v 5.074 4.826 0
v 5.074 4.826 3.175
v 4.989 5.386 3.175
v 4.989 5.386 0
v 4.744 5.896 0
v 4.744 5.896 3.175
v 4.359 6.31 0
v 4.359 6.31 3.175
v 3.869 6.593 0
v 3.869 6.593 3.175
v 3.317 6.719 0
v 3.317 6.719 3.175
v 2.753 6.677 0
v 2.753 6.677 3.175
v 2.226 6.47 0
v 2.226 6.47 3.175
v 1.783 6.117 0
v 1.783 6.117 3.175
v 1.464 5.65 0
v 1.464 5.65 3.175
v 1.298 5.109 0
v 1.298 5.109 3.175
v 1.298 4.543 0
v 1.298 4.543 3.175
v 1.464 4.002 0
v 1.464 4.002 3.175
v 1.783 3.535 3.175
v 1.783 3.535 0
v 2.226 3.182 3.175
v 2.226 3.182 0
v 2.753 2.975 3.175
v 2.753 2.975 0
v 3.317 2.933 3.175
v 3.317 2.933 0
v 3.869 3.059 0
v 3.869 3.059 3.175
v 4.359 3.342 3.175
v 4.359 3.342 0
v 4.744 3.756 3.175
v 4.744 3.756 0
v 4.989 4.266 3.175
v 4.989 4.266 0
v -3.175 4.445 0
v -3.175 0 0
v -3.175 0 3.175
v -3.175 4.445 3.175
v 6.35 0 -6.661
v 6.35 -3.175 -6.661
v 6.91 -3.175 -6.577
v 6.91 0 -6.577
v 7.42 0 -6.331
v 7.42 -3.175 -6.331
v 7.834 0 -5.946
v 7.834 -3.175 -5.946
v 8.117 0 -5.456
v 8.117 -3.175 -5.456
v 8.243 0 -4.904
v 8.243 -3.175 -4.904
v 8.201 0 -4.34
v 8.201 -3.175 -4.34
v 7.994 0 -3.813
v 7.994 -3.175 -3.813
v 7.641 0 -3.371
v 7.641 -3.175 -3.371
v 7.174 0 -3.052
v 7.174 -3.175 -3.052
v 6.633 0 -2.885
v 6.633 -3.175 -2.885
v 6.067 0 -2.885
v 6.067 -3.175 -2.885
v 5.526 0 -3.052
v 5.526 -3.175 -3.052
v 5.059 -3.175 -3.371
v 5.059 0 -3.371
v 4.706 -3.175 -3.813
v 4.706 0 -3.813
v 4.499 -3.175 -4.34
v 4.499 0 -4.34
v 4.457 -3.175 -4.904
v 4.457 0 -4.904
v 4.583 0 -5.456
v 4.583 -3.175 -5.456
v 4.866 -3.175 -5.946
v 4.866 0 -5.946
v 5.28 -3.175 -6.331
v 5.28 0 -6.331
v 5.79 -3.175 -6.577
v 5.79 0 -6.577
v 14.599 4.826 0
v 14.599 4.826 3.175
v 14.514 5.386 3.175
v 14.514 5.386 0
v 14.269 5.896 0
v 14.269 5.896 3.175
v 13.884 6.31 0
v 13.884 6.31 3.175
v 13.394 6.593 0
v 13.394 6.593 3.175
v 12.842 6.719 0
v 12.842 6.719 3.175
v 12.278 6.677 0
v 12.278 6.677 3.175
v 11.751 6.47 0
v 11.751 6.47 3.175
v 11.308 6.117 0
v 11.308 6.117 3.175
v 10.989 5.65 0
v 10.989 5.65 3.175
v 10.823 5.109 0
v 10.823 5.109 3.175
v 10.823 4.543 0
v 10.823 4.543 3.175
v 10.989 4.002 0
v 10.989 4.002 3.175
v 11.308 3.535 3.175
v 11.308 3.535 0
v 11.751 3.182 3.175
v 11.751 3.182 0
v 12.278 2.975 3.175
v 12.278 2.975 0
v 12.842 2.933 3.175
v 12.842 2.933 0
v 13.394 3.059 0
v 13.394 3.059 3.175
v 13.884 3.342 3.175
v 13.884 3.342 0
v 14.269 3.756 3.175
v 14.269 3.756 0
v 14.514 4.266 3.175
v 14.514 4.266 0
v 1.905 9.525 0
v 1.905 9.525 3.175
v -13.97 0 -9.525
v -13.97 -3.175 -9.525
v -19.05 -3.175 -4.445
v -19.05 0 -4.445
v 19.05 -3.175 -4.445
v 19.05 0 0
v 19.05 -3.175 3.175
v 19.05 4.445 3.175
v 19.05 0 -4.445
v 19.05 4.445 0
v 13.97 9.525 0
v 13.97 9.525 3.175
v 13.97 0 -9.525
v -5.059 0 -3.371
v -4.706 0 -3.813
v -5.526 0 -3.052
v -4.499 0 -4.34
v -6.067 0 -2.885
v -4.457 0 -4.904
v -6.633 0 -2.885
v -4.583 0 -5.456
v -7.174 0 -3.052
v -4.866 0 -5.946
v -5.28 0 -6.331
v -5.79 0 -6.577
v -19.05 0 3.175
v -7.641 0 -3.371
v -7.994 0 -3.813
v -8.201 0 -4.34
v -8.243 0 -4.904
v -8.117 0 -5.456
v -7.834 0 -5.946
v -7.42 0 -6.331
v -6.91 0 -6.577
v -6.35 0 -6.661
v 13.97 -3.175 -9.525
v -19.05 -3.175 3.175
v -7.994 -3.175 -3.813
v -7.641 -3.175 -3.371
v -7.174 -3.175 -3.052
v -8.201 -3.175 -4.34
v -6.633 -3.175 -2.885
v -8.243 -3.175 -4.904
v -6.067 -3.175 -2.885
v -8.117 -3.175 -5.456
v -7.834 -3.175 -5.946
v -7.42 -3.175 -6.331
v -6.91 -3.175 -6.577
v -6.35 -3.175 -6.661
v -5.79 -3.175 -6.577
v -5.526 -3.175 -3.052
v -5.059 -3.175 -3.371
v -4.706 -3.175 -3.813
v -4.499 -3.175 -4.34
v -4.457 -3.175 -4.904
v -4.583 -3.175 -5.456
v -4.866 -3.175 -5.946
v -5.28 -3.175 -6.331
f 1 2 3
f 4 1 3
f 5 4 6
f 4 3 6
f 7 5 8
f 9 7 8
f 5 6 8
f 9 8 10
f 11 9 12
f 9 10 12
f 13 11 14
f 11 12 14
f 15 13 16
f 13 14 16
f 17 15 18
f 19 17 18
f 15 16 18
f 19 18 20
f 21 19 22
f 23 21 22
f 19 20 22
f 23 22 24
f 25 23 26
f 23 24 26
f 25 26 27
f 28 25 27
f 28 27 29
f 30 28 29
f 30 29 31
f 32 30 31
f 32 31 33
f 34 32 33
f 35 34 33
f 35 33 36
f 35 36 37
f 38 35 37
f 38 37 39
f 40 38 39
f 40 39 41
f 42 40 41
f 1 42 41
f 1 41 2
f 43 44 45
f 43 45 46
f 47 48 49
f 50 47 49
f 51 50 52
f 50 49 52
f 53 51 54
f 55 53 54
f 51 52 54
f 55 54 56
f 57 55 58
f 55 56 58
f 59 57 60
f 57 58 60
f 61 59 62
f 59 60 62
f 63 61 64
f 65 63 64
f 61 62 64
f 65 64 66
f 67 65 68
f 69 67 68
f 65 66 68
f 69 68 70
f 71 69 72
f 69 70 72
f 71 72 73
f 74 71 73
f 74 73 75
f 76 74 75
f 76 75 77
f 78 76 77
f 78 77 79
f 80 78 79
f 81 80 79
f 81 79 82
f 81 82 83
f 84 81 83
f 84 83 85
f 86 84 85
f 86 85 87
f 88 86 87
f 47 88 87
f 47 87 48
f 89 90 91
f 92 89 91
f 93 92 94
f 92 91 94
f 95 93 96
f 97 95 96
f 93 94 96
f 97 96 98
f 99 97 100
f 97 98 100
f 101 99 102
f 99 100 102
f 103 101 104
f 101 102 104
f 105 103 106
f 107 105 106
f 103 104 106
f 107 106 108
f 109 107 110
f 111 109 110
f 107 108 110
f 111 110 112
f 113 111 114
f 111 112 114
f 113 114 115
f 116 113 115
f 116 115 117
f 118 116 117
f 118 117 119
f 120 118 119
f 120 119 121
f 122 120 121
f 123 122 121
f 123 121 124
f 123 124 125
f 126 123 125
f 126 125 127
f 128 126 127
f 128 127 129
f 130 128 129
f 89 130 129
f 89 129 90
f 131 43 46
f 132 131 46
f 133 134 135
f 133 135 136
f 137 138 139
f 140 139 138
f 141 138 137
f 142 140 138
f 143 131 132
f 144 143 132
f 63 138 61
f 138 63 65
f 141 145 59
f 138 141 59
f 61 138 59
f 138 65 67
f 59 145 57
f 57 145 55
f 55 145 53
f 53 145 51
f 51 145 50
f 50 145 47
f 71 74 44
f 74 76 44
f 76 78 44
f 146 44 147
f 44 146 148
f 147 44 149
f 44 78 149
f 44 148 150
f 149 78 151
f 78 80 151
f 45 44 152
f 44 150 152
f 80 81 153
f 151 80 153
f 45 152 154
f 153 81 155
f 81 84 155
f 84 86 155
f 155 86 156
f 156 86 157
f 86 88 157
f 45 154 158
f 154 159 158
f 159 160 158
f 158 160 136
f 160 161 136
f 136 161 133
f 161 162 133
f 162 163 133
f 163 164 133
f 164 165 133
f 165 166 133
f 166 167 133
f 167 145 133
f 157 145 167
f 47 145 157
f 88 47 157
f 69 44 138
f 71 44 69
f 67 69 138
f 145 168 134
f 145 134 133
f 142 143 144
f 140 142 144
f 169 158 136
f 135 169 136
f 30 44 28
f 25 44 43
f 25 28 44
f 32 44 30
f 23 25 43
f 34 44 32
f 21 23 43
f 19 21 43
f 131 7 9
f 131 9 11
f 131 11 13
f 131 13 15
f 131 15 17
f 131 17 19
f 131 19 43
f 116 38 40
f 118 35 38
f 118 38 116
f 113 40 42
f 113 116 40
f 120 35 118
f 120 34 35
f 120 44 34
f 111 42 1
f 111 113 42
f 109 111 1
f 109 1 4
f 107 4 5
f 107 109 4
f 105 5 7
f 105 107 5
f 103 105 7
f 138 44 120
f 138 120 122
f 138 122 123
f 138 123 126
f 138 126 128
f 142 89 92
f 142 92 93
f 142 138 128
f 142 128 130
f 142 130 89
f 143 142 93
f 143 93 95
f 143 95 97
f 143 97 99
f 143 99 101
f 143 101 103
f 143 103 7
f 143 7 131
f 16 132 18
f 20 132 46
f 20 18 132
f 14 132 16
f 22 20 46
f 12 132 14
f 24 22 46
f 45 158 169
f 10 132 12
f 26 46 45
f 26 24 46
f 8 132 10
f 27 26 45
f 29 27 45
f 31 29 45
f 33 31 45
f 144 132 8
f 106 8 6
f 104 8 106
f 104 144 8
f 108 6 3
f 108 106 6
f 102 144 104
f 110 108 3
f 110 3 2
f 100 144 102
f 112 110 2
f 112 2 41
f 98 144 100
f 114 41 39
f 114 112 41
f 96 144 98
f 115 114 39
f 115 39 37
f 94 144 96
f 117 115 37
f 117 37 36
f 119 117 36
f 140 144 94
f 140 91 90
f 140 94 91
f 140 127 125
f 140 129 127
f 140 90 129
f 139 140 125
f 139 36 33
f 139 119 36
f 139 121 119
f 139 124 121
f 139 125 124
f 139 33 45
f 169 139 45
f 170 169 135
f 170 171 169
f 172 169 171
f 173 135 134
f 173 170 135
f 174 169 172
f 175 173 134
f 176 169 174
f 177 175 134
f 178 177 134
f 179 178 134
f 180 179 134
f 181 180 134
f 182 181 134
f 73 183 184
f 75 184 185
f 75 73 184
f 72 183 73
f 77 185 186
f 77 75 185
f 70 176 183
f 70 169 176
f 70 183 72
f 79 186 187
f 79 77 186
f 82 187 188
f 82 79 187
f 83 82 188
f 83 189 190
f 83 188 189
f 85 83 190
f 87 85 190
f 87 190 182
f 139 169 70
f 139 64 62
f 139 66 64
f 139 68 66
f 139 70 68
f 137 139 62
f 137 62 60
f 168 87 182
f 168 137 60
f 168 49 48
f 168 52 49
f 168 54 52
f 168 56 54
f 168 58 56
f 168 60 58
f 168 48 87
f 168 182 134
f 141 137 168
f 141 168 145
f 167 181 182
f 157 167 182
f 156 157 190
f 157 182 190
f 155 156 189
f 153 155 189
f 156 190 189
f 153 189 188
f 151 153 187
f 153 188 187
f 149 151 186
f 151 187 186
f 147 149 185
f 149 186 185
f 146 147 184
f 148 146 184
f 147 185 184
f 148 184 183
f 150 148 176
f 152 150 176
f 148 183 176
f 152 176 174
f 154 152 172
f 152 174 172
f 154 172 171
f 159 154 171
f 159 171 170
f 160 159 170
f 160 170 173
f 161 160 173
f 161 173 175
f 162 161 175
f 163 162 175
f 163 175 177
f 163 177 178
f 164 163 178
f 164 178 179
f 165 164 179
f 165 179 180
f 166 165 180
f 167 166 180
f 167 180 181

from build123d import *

# Parameters (mm, degrees)
EXTRUDE1_DEPTH                      = 19.05
EXTRUDE1_DEPTH_BACK                 = 19.05
F_6_CLEARANCE_HOLE1_D               = 3.7973
F_6_CLEARANCE_HOLE1_DEPTH           = 6.35
F_6_CLEARANCE_HOLE1_TIP             = 1.140824014
F_6_CLEARANCE_HOLE1_ON_FACE_2_D     = 3.7973
F_6_CLEARANCE_HOLE1_ON_FACE_2_DEPTH = 6.35
F_6_CLEARANCE_HOLE1_ON_FACE_2_TIP   = 1.140824014
SKETCH3_W                           = 15.875
SKETCH3_H                           = 9.525
CUT_EXTRUDE1_DEPTH                  = 4.175
CHAMFER1_SIZE                       = 5.08


with BuildPart() as part:
    # Sketch1 → Extrude1 (new body, two sides)
    with BuildSketch(Plane(origin=(0, 0, 0), x_dir=(0, 0, -1), z_dir=(1, 0, 0))) as extrude1_sk:
        Polygon((-3.175, 9.525), (-3.175, -3.175), (9.525, -3.175), (9.525, 0), (0, 0), (0, 9.525), align=None)
    extrude(amount=EXTRUDE1_DEPTH)
    extrude(extrude1_sk.sketch, amount=-EXTRUDE1_DEPTH_BACK)

    # 6 Clearance Hole1
    with Locations(Plane(origin=(6.35, 0, -4.7625), x_dir=(0, 0, 1), z_dir=(0, 1, 0))):
        with Locations((0, 0), (0, -12.7)):
            Hole(F_6_CLEARANCE_HOLE1_D / 2, depth=F_6_CLEARANCE_HOLE1_DEPTH)
            with Locations((0, 0, -(F_6_CLEARANCE_HOLE1_DEPTH + F_6_CLEARANCE_HOLE1_TIP / 2))):  # 118° drill point
                Cone(0, F_6_CLEARANCE_HOLE1_D / 2, F_6_CLEARANCE_HOLE1_TIP, mode=Mode.SUBTRACT)

    # 6 Clearance Hole1 on face 2
    with Locations(Plane(origin=(3.175, 4.826, 0), x_dir=(-1, 0, 0), z_dir=(0, 0, -1))):
        with Locations((0, 0), (-9.525, 0)):
            Hole(F_6_CLEARANCE_HOLE1_ON_FACE_2_D / 2, depth=F_6_CLEARANCE_HOLE1_ON_FACE_2_DEPTH)
            with Locations((0, 0, -(F_6_CLEARANCE_HOLE1_ON_FACE_2_DEPTH + F_6_CLEARANCE_HOLE1_ON_FACE_2_TIP / 2))):  # 118° drill point
                Cone(0, F_6_CLEARANCE_HOLE1_ON_FACE_2_D / 2, F_6_CLEARANCE_HOLE1_ON_FACE_2_TIP, mode=Mode.SUBTRACT)

    # Sketch3 → Cut-Extrude1 (cut, through all)
    with BuildSketch(Plane(origin=(0, 0, 0), x_dir=(-1, 0, 0), z_dir=(0, 0, -1))):
        with Locations((11.1125, 4.7625)):
            Rectangle(SKETCH3_W, SKETCH3_H)
    extrude(amount=-CUT_EXTRUDE1_DEPTH, mode=Mode.SUBTRACT)

    # Chamfer1
    chamfer1_edges = [part.edges().sort_by_distance(p)[0] for p in [
        (19.05, -1.5875, -9.525),
        (-19.05, -1.5875, -9.525),
        (19.05, 9.525, 1.5875),
        (-3.175, 9.525, 1.5875),
    ]]
    chamfer(chamfer1_edges, length=CHAMFER1_SIZE)


solid = part.part
